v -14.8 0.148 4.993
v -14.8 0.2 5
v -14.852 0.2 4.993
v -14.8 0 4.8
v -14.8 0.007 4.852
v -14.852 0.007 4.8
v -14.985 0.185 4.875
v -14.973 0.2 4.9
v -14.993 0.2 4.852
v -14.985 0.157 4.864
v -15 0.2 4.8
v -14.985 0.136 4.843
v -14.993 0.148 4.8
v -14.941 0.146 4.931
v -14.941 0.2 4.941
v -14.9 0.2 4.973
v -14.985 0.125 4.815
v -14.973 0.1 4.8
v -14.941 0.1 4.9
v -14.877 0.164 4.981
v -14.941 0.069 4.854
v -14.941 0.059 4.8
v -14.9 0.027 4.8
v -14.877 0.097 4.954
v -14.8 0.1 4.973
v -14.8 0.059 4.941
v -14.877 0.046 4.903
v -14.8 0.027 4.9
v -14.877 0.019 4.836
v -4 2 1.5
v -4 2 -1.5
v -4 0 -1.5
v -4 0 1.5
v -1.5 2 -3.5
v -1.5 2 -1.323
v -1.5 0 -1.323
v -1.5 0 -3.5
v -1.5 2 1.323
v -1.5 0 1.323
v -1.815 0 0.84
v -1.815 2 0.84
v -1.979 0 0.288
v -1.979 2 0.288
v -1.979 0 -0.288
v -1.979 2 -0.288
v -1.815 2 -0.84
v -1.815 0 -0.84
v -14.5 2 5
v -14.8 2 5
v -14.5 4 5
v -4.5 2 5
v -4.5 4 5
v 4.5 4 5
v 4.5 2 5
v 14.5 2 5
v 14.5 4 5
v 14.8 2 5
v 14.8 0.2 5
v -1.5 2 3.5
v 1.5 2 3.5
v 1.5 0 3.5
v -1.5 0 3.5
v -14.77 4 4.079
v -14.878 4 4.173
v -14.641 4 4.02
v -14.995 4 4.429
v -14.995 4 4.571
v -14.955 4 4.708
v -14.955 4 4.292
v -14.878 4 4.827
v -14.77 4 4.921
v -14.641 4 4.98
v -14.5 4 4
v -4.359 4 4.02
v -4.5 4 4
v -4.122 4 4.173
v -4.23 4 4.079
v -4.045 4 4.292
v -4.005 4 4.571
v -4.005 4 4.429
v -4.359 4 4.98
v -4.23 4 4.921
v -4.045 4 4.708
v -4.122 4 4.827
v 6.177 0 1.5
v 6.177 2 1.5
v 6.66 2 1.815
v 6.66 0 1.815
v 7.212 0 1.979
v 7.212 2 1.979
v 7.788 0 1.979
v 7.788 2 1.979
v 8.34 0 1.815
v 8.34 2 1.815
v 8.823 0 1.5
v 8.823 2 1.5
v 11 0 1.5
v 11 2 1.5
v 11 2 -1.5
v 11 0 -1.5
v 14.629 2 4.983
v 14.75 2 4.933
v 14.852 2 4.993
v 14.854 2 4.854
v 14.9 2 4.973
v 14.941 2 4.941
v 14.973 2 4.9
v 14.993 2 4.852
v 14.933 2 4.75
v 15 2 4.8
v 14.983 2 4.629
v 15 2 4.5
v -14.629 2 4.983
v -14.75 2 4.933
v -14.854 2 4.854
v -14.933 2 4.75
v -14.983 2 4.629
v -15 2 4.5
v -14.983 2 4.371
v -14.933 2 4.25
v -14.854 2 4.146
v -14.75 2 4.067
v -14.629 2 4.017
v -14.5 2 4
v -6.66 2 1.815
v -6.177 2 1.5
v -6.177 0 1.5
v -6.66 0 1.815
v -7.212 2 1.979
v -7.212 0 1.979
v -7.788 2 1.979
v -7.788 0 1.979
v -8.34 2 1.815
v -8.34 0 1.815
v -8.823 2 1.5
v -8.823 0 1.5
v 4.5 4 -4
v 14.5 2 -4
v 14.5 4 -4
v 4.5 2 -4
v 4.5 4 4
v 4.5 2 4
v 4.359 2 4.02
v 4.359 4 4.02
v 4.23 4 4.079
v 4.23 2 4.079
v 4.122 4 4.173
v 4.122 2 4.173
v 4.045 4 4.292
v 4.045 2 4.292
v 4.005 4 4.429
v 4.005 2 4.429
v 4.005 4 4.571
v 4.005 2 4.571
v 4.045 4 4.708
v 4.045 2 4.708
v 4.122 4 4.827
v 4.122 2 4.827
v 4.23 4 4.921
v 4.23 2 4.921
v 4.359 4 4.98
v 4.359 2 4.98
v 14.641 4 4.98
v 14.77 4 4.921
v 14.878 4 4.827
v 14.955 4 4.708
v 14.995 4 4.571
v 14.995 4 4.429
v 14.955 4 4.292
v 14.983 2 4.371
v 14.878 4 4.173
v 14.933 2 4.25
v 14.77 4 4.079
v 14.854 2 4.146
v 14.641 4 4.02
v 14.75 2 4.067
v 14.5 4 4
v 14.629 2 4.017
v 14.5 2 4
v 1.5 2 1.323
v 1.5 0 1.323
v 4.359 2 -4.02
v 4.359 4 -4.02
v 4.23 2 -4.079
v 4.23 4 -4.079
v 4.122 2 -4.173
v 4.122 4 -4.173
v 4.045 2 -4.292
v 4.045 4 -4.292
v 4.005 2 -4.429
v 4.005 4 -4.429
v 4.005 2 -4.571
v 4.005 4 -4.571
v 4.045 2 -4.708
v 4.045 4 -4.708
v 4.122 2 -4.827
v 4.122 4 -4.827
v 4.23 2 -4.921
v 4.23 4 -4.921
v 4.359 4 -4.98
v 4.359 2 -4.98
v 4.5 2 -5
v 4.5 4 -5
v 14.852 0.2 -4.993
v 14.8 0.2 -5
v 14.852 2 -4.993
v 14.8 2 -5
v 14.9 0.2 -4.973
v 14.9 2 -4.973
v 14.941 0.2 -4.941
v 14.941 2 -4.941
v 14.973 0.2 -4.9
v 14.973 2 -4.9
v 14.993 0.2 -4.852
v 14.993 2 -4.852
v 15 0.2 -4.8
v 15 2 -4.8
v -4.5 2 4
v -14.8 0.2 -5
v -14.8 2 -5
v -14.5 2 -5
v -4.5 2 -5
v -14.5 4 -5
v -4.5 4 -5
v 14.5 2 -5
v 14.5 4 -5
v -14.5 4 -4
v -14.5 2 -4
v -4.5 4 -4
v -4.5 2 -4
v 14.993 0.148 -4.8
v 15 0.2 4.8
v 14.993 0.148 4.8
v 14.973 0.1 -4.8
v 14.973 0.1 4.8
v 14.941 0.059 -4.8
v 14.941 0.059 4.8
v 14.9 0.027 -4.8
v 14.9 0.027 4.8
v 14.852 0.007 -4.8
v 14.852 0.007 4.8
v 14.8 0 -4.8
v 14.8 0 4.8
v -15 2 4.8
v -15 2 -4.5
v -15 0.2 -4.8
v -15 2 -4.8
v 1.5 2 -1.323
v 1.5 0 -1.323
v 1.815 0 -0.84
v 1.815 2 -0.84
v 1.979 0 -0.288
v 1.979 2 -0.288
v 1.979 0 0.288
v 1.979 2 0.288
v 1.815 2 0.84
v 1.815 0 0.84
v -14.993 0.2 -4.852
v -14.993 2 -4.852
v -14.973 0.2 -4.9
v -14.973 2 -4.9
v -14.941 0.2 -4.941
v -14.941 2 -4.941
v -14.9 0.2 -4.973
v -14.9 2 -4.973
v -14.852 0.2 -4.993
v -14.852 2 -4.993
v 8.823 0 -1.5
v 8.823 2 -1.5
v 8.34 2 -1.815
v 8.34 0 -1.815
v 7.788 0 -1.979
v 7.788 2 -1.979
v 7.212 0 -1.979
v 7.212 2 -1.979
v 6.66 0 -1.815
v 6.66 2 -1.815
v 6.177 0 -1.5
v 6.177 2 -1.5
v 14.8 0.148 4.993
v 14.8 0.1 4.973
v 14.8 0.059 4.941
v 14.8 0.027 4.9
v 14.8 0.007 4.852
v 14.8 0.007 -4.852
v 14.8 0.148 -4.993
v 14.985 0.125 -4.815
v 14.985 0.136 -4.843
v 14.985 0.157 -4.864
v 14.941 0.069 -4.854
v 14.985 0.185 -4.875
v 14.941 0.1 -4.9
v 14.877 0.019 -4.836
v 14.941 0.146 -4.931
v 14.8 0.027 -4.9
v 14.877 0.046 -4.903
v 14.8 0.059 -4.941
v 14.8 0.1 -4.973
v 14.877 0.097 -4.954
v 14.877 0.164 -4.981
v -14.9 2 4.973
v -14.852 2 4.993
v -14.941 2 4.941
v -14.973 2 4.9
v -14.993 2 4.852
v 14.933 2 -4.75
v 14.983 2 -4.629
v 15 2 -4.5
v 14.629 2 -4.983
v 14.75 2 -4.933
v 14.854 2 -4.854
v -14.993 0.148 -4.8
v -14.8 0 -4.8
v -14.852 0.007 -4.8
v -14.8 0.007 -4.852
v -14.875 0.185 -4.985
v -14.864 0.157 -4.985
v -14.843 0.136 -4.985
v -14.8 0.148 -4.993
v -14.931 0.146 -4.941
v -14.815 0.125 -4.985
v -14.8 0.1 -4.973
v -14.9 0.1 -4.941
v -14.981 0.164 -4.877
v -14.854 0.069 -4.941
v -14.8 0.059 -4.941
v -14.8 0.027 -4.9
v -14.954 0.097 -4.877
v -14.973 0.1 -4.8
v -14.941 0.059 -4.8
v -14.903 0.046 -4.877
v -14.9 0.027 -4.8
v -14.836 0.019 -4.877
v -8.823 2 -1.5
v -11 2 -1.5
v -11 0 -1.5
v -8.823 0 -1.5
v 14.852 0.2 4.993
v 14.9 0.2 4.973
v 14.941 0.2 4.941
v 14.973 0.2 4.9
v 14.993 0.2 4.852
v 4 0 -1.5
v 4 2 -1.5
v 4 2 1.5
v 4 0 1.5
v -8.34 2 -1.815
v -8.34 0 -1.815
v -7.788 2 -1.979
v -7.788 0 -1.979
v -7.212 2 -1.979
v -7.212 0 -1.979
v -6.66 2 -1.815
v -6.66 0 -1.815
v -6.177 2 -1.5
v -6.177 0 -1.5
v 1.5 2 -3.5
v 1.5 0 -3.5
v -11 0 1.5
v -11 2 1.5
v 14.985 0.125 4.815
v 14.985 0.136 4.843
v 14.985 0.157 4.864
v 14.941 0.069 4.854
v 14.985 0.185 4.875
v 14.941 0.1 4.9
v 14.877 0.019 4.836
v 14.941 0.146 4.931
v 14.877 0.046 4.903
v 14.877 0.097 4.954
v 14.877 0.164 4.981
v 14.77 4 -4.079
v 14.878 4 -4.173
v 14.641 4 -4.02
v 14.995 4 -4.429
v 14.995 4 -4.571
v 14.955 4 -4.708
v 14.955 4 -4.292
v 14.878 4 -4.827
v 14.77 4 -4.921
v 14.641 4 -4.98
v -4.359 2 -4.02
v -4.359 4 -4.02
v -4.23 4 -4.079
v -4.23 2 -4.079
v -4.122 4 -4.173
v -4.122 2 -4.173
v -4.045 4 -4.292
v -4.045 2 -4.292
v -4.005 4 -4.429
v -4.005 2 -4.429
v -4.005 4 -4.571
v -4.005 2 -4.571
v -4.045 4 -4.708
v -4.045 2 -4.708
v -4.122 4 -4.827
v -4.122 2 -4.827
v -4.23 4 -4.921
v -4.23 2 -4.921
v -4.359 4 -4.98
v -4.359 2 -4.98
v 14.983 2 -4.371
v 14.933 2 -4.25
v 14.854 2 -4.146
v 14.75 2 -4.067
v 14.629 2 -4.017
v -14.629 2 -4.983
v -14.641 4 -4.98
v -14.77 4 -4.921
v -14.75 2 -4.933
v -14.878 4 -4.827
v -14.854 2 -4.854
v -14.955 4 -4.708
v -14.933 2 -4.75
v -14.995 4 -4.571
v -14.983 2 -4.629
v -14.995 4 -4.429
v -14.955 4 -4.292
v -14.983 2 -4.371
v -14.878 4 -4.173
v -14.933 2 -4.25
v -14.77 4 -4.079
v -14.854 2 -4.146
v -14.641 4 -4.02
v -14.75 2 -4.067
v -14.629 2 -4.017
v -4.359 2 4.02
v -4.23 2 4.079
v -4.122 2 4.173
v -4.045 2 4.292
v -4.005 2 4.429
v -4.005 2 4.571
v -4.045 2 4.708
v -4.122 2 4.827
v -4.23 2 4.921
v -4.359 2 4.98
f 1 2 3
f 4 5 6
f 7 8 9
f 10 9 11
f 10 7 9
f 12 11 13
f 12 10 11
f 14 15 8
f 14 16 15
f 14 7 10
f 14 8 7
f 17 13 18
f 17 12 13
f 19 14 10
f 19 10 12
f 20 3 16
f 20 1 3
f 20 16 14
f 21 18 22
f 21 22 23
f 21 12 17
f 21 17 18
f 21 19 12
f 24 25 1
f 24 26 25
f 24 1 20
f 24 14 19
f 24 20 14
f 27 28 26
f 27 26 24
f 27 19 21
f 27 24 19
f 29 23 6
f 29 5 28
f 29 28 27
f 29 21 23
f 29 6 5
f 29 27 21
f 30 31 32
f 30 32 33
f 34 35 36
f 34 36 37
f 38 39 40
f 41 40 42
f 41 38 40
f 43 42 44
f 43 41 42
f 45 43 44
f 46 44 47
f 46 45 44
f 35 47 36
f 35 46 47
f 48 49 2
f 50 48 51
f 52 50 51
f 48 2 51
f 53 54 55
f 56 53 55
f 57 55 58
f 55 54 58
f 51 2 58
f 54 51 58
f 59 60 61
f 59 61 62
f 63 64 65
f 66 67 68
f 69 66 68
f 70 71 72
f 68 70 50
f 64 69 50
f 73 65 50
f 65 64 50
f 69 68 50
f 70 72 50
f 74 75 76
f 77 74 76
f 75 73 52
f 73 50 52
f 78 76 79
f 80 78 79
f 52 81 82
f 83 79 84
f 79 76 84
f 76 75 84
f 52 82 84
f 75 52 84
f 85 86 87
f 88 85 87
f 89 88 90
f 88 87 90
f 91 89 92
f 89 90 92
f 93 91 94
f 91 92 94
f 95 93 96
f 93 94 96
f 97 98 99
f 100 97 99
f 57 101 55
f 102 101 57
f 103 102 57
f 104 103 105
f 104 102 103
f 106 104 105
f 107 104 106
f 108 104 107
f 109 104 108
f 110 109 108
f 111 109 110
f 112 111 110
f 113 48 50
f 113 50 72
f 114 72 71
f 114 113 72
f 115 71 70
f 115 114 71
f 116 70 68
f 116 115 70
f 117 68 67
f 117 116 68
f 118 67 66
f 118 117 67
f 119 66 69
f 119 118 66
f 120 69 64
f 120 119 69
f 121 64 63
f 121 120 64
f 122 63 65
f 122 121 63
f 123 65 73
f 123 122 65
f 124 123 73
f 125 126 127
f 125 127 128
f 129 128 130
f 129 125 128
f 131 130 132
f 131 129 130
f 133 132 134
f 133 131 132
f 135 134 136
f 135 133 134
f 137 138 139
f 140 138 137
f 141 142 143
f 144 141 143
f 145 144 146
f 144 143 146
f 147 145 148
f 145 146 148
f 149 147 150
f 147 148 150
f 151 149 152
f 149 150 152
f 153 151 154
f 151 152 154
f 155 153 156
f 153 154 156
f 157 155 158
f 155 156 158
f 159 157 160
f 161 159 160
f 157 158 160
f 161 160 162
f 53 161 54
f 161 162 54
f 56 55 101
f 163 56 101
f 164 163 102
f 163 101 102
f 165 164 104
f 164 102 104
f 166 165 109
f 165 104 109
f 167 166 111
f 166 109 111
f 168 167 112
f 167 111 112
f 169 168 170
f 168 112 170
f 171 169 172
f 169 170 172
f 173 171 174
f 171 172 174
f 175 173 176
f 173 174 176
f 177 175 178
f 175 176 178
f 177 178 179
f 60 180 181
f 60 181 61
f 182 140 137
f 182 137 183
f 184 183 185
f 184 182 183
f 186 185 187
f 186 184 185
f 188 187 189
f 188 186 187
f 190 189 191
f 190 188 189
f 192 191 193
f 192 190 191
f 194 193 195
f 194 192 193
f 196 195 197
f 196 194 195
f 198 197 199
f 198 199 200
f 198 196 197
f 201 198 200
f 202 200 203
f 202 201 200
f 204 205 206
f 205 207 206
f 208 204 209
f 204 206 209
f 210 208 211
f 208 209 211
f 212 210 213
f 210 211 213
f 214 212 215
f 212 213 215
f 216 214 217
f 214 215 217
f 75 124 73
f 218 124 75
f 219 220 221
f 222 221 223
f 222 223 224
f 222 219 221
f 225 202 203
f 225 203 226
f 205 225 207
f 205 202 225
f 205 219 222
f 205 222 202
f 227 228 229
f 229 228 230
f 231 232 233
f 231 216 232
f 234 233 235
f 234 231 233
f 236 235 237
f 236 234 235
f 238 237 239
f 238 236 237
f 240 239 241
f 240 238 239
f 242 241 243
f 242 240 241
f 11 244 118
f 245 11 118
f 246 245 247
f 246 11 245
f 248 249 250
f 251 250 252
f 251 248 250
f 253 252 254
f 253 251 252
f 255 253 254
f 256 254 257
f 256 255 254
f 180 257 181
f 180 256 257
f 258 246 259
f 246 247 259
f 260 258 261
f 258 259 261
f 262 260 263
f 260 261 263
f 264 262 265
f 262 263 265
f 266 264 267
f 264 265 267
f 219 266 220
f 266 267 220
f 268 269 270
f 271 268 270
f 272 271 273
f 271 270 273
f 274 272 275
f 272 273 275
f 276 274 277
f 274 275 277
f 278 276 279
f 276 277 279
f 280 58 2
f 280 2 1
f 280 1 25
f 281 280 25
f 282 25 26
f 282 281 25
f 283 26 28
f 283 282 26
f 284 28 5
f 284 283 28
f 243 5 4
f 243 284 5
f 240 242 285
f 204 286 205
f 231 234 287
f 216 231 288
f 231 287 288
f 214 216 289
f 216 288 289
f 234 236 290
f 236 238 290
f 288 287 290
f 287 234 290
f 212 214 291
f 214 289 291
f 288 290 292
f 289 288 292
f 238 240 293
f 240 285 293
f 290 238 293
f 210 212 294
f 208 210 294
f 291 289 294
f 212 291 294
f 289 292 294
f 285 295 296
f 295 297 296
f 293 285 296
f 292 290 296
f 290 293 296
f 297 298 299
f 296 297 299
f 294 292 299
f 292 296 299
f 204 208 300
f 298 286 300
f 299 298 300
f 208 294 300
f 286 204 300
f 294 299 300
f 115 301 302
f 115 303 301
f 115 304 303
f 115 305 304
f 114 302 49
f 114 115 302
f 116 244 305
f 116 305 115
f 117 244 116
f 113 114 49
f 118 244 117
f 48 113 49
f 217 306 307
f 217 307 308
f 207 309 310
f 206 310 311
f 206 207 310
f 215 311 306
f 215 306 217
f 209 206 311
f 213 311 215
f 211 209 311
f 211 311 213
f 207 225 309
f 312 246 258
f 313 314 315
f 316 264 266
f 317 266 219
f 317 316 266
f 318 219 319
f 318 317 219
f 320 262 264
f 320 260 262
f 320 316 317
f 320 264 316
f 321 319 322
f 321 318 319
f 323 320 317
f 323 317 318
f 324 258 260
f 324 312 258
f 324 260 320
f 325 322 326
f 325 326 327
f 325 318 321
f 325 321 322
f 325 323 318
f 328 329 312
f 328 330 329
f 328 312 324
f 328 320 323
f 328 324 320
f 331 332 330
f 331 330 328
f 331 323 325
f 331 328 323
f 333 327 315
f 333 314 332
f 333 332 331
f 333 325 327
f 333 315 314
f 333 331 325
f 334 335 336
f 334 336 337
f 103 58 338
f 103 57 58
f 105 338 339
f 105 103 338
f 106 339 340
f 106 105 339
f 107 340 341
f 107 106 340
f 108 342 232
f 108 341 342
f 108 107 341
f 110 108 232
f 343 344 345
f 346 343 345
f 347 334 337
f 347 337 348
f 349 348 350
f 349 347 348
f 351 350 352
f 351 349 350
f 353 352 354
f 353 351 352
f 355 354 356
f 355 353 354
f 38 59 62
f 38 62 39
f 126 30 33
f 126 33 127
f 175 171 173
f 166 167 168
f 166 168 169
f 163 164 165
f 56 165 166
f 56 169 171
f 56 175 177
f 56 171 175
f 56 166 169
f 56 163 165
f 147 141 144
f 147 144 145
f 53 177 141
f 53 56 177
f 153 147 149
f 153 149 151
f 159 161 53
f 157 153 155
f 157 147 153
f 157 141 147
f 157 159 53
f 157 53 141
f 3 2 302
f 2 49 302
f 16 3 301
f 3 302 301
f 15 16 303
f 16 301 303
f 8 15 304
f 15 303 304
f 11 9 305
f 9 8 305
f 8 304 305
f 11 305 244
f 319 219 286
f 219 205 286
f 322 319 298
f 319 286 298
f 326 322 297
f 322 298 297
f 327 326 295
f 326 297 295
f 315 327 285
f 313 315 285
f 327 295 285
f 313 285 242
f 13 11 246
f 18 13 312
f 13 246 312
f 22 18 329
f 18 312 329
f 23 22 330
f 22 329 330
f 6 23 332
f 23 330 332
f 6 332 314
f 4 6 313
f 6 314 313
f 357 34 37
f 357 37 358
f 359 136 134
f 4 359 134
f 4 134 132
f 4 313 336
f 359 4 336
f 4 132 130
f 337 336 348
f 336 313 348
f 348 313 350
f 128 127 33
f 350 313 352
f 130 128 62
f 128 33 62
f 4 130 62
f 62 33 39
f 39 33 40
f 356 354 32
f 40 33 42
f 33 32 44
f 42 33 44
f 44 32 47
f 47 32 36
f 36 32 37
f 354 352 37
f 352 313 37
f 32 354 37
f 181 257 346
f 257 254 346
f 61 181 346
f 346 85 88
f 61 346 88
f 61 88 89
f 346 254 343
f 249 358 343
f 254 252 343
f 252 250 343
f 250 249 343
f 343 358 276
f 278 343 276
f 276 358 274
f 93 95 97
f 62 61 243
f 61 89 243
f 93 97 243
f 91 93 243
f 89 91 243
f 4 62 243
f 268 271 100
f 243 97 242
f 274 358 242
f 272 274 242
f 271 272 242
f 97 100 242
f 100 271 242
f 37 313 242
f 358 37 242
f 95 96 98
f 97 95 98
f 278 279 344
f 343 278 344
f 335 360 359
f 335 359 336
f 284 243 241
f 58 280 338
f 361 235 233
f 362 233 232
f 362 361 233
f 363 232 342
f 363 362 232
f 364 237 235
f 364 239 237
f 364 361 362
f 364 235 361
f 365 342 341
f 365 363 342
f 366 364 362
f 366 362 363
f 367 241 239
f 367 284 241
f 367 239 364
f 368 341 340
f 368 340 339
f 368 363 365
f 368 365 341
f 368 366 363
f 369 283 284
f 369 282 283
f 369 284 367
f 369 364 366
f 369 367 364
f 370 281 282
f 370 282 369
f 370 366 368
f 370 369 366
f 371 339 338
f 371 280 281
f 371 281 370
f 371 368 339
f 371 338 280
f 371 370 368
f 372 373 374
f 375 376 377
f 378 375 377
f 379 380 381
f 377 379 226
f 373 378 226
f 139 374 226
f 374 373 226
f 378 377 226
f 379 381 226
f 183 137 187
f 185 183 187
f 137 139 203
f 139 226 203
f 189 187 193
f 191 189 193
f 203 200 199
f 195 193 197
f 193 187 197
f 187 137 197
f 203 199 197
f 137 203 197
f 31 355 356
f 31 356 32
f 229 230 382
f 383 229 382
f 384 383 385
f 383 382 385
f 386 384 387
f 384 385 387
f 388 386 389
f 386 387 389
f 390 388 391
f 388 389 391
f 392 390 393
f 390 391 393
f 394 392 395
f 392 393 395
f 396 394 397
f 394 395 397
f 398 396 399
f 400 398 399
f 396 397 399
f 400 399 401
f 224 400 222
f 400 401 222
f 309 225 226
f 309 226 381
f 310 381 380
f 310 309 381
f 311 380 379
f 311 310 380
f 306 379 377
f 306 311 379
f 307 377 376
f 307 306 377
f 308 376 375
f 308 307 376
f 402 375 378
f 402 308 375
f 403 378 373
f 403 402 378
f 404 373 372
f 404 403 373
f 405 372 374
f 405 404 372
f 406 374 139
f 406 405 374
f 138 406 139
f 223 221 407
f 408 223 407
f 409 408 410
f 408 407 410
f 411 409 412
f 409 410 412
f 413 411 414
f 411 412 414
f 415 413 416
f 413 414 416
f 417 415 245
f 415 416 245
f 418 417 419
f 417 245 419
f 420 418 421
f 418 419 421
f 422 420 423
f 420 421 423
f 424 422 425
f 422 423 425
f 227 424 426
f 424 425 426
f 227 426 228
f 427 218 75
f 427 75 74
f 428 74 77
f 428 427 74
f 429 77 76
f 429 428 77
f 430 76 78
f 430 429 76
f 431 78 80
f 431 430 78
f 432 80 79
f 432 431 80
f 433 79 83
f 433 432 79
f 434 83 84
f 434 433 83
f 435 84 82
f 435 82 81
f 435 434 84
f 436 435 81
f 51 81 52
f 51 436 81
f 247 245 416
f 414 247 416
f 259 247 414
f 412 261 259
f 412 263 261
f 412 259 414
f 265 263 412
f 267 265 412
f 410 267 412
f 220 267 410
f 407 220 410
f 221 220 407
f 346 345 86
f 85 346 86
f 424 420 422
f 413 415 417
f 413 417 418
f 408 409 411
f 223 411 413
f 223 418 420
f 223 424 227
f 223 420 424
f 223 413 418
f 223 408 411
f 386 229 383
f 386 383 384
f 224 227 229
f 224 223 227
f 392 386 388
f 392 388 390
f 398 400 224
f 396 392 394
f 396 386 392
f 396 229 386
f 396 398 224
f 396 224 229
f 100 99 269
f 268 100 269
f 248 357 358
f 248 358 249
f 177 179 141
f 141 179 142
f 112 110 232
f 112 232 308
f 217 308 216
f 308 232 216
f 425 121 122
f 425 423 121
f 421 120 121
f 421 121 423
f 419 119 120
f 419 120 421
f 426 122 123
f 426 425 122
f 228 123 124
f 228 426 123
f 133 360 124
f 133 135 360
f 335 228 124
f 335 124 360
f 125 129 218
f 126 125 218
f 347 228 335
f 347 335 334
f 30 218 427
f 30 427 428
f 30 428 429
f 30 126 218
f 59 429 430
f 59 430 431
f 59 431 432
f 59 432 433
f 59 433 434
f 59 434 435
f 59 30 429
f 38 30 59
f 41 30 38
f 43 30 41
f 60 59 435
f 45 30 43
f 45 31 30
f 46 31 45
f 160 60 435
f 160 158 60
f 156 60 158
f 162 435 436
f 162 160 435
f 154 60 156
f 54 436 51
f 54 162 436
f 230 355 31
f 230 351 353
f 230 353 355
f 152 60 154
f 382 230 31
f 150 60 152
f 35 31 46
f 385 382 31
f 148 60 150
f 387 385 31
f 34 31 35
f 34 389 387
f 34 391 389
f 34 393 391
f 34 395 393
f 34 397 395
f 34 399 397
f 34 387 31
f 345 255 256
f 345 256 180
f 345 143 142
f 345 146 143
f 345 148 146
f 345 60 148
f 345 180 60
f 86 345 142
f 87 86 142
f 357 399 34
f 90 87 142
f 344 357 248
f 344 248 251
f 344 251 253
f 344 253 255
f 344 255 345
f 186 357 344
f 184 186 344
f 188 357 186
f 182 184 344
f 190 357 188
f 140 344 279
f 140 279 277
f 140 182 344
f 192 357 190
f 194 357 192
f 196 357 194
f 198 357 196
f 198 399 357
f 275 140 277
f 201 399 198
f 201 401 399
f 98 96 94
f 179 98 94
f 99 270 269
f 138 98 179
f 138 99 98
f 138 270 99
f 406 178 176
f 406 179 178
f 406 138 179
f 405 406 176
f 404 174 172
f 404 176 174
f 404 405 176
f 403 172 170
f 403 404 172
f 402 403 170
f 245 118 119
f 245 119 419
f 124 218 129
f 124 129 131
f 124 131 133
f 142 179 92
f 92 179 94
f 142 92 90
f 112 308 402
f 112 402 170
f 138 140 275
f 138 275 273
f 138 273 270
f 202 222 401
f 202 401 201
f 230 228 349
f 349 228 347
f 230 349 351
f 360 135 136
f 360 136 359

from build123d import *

# Parameters (mm, degrees)
SKETCH_1_W            = 30
SKETCH_1_H            = 10
EXTRUDE_1_DEPTH       = 2
EXTRUDE_2_DEPTH       = 2
MIRROR_2_COPY_1_DEPTH = 2
CUT_EXTRUDE_1_REACH   = 17.937
CUT_EXTRUDE_2_REACH   = 17.937
FILLET_1_R            = 0.2


with BuildPart() as part:
    # 草图1 → 凸台-拉伸1 (new body)
    with BuildSketch(Plane(origin=(0, 0, 0), x_dir=(1, 0, 0), z_dir=(0, 1, 0))):
        Rectangle(SKETCH_1_W, SKETCH_1_H)
    extrude(amount=EXTRUDE_1_DEPTH)

    # 草图2 → 凸台-拉伸2 (add)
    with BuildSketch(Plane(origin=(0, 2, 0), x_dir=(1, 0, 0), z_dir=(0, 1, 0))):
        with BuildLine():
            Line((-14.5, 4), (-4.5, 4))
            ThreePointArc((-4.5, 4), (-4, 4.5), (-4.5, 5))
            Line((-4.5, 5), (-14.5, 5))
            ThreePointArc((-14.5, 5), (-15, 4.5), (-14.5, 4))
        make_face()
    extrude_2 = extrude(amount=EXTRUDE_2_DEPTH)

    # 镜向1: 凸台-拉伸2 across plane
    add(extrude_2.mirror(Plane.XY))

    # 镜向2: 凸台-拉伸2 across plane
    add(extrude_2.mirror(Plane(origin=(0, 0, 0), x_dir=(0, 0, 1), z_dir=(1, 0, 0))))

    # 镜向2 copy 1 sketch → 镜向2 copy 1 (add)
    with BuildSketch(Plane(origin=(0, 2, 0), x_dir=(-1, 0, 0), z_dir=(0, 1, 0))):
        with BuildLine():
            Line((-14.5, 4), (-4.5, 4))
            ThreePointArc((-4.5, 4), (-4, 4.5), (-4.5, 5))
            Line((-4.5, 5), (-14.5, 5))
            ThreePointArc((-14.5, 5), (-15, 4.5), (-14.5, 4))
        make_face()
    extrude(amount=MIRROR_2_COPY_1_DEPTH)

    # 草图3 → 切除-拉伸1 (cut, up to next)
    with BuildSketch(Plane(origin=(0, 2, 0), x_dir=(1, 0, 0), z_dir=(0, 1, 0)), mode=Mode.PRIVATE) as cut_extrude_1_sk1:
        with BuildLine():
            Line((1.5, -3.5), (-1.5, -3.5))
            Line((-1.5, -3.5), (-1.5, -1.322875656))
            ThreePointArc((-1.5, -1.322875656), (-2, 0), (-1.5, 1.322875656))
            Line((-1.5, 1.322875656), (-1.5, 3.5))
            Line((-1.5, 3.5), (1.5, 3.5))
            Line((1.5, 3.5), (1.5, 1.322875656))
            ThreePointArc((1.5, 1.322875656), (2, 0), (1.5, -1.322875656))
            Line((1.5, -1.322875656), (1.5, -3.5))
        make_face()
    cut_extrude_1_tool1 = extrude(cut_extrude_1_sk1.sketch, amount=-CUT_EXTRUDE_1_REACH, mode=Mode.PRIVATE) & part.part
    add(cut_extrude_1_tool1.solids().sort_by_distance((0, 2, 0))[0], mode=Mode.SUBTRACT)

    # 草图4 → 切除-拉伸2 (cut, up to next)
    with BuildSketch(Plane(origin=(0, 2, 0), x_dir=(1, 0, 0), z_dir=(0, 1, 0)), mode=Mode.PRIVATE) as cut_extrude_2_sk1:
        with BuildLine():
            Line((-4, 1.5), (-4, -1.5))
            Line((-4, -1.5), (-6.177124344, -1.5))
            ThreePointArc((-6.177124344, -1.5), (-7.5, -2), (-8.822875656, -1.5))
            Line((-8.822875656, -1.5), (-11, -1.5))
            Line((-11, -1.5), (-11, 1.5))
            Line((-11, 1.5), (-8.822875656, 1.5))
            ThreePointArc((-8.822875656, 1.5), (-7.5, 2), (-6.177124344, 1.5))
            Line((-6.177124344, 1.5), (-4, 1.5))
        make_face()
    cut_extrude_2_tool1 = extrude(cut_extrude_2_sk1.sketch, amount=-CUT_EXTRUDE_2_REACH, mode=Mode.PRIVATE) & part.part
    cut_extrude_2 = cut_extrude_2_tool1.solids().sort_by_distance((-7.5, 2, 0))[0]
    add(cut_extrude_2, mode=Mode.SUBTRACT)

    # 镜向3: 切除-拉伸2 across plane
    add(cut_extrude_2.mirror(Plane(origin=(0, 0, 0), x_dir=(0, 0, 1), z_dir=(1, 0, 0))), mode=Mode.SUBTRACT)

    # 圆角1
    fillet_1_edges = [part.edges().sort_by_distance(p)[0] for p in [
        (0, 0, 5),
        (-15, 1, 5),
        (-15, 0, 0),
        (-15, 1, -5),
        (0, 0, -5),
        (15, 0, 0),
        (15, 1, -5),
        (15, 1, 5),
    ]]
    fillet(fillet_1_edges, radius=FILLET_1_R)


solid = part.part
